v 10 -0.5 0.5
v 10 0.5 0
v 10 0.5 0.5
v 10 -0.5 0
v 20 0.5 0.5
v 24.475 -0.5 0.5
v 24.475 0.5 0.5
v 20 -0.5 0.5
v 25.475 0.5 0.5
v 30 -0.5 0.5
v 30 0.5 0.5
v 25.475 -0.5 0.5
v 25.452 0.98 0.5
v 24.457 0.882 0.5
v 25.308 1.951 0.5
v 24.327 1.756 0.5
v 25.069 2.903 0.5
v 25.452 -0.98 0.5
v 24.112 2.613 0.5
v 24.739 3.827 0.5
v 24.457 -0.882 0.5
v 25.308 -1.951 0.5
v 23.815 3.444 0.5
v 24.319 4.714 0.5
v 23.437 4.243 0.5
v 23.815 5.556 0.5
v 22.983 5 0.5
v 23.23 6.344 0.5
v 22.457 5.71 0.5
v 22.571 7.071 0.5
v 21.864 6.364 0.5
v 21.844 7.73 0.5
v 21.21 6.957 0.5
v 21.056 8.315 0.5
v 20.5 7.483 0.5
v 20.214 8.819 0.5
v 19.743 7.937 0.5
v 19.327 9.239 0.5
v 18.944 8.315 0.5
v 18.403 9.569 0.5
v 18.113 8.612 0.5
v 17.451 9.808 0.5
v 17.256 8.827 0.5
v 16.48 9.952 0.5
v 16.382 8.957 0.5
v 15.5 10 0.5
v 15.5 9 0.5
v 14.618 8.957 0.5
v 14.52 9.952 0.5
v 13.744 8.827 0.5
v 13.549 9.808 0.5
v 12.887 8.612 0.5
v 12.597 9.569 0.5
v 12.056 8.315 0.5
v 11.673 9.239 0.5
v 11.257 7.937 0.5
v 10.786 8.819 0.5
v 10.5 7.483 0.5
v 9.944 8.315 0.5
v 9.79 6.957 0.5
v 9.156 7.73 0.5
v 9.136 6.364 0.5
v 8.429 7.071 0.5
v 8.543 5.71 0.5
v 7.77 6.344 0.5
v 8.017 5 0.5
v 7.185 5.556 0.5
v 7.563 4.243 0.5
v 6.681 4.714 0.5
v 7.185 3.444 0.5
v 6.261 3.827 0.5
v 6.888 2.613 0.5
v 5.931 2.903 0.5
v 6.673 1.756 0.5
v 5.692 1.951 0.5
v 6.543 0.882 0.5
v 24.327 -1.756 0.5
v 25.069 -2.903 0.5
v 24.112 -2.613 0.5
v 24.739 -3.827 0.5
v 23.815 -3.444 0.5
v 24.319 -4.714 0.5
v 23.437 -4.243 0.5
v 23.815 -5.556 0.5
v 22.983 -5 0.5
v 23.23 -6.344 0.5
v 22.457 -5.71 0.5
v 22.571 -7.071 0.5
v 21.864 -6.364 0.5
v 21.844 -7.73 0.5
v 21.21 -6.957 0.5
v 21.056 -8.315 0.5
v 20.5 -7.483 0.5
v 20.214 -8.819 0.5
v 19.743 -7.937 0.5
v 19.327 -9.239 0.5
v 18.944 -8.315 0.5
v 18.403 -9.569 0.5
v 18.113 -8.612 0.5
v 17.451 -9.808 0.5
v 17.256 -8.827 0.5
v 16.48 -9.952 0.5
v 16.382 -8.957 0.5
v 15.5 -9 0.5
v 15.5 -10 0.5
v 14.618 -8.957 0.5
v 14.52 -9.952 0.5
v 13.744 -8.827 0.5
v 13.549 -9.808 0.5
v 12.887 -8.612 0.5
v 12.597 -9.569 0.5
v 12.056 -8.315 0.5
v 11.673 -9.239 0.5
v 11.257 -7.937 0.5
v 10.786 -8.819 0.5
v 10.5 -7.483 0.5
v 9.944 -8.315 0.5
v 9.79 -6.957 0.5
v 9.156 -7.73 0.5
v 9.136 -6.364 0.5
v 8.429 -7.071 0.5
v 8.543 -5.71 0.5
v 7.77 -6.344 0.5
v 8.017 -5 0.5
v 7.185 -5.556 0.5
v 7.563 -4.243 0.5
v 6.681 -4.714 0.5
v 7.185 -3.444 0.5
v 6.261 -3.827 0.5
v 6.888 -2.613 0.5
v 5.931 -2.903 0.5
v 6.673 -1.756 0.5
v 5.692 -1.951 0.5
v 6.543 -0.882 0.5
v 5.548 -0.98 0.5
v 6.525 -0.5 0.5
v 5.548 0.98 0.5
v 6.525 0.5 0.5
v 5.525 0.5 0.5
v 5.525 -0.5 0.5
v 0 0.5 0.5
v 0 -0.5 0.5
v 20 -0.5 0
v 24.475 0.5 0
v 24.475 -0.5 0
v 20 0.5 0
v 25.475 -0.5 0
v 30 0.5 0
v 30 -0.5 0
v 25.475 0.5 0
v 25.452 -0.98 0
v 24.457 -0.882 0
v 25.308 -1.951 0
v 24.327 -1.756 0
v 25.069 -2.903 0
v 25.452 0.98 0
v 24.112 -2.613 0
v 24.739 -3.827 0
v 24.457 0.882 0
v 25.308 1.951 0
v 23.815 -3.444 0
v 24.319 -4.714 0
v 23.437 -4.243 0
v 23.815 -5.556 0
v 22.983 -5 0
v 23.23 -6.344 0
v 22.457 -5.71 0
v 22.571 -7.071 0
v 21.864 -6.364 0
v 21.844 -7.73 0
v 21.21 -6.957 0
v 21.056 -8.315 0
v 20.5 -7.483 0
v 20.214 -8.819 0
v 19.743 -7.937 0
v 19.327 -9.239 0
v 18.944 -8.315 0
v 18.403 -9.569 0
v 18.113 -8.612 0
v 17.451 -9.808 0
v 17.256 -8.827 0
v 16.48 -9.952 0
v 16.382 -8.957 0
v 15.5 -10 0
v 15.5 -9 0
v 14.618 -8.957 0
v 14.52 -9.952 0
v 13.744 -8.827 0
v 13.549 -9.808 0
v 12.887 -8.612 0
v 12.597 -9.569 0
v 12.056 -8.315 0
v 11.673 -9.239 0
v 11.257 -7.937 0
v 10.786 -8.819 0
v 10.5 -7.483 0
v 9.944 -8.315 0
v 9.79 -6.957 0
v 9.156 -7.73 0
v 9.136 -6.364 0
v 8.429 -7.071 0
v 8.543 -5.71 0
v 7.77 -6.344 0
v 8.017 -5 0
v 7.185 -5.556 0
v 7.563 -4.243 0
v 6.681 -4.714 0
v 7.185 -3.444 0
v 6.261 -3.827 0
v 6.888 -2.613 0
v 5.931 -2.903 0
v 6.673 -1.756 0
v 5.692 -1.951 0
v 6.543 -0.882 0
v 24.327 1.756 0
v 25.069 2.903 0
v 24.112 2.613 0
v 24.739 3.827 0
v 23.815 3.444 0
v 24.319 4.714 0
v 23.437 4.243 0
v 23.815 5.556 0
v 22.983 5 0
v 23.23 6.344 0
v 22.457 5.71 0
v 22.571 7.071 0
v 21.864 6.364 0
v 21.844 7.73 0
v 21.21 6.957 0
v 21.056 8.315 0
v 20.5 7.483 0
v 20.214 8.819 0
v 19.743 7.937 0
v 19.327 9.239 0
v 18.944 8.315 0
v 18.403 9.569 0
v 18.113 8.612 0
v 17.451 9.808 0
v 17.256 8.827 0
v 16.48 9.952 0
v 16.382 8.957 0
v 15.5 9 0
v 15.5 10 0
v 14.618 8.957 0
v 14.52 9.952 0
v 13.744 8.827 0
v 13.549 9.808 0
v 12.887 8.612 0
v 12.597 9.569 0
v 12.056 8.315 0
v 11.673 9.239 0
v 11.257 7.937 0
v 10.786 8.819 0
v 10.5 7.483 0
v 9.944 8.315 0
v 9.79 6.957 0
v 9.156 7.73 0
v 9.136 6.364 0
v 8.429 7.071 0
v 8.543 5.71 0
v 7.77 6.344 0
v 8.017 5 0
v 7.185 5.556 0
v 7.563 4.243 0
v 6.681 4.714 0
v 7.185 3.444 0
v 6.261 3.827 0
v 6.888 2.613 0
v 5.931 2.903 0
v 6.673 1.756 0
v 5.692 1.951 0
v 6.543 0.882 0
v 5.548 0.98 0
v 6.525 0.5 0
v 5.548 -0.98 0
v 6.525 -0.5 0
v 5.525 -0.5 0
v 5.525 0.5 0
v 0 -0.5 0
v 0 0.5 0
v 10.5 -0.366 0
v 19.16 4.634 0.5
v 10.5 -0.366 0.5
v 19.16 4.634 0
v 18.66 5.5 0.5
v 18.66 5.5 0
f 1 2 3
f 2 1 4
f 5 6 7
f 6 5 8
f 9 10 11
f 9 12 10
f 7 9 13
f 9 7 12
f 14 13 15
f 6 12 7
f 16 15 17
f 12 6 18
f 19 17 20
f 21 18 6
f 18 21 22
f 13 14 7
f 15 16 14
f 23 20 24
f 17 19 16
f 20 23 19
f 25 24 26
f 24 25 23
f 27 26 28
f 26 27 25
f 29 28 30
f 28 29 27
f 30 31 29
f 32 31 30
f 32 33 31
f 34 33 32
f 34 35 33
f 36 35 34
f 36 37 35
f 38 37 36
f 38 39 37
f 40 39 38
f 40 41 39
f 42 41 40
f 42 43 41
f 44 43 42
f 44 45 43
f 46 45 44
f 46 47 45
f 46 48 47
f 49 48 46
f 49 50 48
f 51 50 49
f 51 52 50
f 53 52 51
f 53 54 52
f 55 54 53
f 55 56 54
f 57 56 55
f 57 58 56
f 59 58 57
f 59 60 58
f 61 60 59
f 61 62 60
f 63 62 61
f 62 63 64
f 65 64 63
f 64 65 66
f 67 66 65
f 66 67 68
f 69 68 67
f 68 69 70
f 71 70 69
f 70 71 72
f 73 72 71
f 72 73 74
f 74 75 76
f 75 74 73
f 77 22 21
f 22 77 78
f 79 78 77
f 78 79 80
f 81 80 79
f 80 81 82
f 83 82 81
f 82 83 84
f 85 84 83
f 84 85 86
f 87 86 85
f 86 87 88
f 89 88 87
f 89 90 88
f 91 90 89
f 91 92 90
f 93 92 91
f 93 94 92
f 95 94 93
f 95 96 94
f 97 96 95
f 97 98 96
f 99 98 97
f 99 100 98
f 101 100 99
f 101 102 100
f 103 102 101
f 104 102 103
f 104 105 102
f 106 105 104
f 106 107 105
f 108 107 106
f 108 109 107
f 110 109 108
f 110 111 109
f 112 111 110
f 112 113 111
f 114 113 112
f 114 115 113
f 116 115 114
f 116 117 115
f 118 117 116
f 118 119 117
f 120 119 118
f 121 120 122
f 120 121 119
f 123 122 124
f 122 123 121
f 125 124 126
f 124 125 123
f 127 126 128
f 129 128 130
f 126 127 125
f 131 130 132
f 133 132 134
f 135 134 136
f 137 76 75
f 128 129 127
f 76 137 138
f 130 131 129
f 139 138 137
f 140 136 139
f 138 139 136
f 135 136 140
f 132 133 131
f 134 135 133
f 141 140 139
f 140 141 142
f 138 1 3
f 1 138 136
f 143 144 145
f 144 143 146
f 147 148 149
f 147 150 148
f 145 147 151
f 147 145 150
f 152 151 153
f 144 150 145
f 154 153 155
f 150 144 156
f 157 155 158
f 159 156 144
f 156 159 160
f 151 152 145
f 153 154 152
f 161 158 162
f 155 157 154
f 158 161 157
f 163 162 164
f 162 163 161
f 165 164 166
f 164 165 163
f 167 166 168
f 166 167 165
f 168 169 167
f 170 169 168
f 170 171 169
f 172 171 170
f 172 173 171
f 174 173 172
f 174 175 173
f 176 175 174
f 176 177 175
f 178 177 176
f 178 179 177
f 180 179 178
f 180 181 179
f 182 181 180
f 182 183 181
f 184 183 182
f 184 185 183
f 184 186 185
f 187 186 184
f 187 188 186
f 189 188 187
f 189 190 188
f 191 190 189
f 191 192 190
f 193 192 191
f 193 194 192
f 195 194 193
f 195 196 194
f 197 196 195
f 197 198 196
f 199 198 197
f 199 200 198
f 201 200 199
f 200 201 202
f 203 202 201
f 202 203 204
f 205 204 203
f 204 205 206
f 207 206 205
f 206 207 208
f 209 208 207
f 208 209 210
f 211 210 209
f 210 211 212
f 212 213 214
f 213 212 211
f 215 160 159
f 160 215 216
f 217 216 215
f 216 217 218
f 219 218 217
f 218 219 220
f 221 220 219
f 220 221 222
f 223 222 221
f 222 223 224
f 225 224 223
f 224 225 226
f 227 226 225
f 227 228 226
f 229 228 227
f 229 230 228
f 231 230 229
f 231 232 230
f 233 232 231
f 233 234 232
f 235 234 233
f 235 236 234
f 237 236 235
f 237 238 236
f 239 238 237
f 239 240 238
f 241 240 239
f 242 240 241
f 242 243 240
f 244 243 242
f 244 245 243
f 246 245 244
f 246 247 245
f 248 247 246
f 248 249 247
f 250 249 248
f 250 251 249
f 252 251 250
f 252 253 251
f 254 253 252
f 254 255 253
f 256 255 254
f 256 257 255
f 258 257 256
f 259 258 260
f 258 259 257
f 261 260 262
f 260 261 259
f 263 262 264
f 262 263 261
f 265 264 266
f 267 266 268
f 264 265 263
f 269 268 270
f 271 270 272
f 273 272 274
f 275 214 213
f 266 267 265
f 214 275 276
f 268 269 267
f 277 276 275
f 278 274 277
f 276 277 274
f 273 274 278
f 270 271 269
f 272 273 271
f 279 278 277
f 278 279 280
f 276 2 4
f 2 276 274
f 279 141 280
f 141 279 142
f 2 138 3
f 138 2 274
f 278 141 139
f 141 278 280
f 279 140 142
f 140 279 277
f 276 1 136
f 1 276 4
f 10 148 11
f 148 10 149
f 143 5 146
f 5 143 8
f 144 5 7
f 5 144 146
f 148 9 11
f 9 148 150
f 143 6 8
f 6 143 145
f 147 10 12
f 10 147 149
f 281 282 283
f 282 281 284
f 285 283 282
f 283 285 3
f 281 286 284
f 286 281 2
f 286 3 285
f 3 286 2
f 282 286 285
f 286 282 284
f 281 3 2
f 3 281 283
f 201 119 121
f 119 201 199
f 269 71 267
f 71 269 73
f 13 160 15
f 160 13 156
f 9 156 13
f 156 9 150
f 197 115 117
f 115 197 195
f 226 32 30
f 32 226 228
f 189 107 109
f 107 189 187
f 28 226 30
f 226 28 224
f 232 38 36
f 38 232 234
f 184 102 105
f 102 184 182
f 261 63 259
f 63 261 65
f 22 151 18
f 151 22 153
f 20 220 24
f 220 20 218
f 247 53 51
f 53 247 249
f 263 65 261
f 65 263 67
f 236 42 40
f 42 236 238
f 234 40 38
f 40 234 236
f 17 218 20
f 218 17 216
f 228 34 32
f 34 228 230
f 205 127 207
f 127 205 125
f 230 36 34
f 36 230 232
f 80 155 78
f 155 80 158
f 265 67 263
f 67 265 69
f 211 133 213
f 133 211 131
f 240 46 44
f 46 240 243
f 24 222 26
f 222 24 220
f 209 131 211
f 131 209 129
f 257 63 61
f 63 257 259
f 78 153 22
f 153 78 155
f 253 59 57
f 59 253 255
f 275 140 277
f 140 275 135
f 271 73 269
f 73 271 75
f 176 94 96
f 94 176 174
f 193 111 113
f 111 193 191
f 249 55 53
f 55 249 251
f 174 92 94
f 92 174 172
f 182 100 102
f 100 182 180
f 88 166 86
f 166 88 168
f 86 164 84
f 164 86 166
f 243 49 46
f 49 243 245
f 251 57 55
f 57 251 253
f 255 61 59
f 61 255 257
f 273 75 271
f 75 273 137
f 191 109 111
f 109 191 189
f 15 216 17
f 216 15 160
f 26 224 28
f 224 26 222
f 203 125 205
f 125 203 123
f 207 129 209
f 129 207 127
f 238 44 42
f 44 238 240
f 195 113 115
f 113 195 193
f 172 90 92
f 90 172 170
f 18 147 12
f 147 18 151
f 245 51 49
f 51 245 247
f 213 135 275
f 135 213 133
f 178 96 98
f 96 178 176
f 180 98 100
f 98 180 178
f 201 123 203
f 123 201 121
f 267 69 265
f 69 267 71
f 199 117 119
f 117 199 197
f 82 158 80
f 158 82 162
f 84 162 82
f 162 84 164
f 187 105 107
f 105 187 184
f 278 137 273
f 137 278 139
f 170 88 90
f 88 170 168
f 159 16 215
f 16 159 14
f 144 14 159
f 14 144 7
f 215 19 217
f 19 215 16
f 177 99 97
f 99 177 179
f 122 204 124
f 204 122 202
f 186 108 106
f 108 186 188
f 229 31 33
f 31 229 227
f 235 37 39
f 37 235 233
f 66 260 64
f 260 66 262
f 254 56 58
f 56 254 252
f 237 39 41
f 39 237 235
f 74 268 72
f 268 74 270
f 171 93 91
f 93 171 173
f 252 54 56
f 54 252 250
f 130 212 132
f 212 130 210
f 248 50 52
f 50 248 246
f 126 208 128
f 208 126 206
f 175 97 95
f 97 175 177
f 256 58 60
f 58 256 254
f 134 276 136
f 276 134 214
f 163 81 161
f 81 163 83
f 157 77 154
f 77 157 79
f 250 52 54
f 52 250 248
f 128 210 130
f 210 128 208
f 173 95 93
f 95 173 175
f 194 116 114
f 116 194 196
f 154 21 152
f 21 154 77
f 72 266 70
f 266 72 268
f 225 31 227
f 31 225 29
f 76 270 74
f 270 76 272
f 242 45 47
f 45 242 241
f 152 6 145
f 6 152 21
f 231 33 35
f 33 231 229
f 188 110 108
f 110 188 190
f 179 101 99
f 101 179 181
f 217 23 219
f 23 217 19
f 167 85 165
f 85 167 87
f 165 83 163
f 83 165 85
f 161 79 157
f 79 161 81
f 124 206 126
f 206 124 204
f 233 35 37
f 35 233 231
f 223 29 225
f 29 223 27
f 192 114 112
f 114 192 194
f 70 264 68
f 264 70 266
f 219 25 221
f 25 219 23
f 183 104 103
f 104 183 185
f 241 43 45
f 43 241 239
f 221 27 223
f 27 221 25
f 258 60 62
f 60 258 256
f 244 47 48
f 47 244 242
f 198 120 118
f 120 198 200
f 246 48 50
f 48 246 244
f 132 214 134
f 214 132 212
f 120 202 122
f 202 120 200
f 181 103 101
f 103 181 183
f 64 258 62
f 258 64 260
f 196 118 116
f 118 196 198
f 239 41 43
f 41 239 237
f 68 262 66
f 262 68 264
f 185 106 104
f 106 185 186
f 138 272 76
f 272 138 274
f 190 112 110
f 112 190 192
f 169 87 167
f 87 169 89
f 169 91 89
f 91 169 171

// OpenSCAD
// file: sym_switch_no.scad
// no = normally open
module switch_no(length, width, thickness, height)
{
    translate([0,-thickness/2,0])cube([length/2-width/2, thickness, height]);
    translate([(length/2+width/2),-thickness/2,0])cube([(length/2-width/2), thickness, height]);
    
    translate([(length/2-width/2),+thickness/2, 0])rotate([0,0,-60])cube([thickness, width, height]);
    
}

switch_no(30, 12, 1, 1);
// main file
use <sym_switch_no.scad>

// no = normally opened
module switch_reed_no(length, width, thickness, height)
{
    switch_no(length, width, thickness, height);
    radius = width;
    translate([2*length/4+thickness/2,0,0]) difference()
    {
        cylinder(r=radius, h=height, $fn=64);
        translate([0,0,-thickness/2])cylinder(r=(radius-thickness), h=(height+thickness), $fn=64);
    }
}

switch_reed_no(30, 10, 1, 0.5);
